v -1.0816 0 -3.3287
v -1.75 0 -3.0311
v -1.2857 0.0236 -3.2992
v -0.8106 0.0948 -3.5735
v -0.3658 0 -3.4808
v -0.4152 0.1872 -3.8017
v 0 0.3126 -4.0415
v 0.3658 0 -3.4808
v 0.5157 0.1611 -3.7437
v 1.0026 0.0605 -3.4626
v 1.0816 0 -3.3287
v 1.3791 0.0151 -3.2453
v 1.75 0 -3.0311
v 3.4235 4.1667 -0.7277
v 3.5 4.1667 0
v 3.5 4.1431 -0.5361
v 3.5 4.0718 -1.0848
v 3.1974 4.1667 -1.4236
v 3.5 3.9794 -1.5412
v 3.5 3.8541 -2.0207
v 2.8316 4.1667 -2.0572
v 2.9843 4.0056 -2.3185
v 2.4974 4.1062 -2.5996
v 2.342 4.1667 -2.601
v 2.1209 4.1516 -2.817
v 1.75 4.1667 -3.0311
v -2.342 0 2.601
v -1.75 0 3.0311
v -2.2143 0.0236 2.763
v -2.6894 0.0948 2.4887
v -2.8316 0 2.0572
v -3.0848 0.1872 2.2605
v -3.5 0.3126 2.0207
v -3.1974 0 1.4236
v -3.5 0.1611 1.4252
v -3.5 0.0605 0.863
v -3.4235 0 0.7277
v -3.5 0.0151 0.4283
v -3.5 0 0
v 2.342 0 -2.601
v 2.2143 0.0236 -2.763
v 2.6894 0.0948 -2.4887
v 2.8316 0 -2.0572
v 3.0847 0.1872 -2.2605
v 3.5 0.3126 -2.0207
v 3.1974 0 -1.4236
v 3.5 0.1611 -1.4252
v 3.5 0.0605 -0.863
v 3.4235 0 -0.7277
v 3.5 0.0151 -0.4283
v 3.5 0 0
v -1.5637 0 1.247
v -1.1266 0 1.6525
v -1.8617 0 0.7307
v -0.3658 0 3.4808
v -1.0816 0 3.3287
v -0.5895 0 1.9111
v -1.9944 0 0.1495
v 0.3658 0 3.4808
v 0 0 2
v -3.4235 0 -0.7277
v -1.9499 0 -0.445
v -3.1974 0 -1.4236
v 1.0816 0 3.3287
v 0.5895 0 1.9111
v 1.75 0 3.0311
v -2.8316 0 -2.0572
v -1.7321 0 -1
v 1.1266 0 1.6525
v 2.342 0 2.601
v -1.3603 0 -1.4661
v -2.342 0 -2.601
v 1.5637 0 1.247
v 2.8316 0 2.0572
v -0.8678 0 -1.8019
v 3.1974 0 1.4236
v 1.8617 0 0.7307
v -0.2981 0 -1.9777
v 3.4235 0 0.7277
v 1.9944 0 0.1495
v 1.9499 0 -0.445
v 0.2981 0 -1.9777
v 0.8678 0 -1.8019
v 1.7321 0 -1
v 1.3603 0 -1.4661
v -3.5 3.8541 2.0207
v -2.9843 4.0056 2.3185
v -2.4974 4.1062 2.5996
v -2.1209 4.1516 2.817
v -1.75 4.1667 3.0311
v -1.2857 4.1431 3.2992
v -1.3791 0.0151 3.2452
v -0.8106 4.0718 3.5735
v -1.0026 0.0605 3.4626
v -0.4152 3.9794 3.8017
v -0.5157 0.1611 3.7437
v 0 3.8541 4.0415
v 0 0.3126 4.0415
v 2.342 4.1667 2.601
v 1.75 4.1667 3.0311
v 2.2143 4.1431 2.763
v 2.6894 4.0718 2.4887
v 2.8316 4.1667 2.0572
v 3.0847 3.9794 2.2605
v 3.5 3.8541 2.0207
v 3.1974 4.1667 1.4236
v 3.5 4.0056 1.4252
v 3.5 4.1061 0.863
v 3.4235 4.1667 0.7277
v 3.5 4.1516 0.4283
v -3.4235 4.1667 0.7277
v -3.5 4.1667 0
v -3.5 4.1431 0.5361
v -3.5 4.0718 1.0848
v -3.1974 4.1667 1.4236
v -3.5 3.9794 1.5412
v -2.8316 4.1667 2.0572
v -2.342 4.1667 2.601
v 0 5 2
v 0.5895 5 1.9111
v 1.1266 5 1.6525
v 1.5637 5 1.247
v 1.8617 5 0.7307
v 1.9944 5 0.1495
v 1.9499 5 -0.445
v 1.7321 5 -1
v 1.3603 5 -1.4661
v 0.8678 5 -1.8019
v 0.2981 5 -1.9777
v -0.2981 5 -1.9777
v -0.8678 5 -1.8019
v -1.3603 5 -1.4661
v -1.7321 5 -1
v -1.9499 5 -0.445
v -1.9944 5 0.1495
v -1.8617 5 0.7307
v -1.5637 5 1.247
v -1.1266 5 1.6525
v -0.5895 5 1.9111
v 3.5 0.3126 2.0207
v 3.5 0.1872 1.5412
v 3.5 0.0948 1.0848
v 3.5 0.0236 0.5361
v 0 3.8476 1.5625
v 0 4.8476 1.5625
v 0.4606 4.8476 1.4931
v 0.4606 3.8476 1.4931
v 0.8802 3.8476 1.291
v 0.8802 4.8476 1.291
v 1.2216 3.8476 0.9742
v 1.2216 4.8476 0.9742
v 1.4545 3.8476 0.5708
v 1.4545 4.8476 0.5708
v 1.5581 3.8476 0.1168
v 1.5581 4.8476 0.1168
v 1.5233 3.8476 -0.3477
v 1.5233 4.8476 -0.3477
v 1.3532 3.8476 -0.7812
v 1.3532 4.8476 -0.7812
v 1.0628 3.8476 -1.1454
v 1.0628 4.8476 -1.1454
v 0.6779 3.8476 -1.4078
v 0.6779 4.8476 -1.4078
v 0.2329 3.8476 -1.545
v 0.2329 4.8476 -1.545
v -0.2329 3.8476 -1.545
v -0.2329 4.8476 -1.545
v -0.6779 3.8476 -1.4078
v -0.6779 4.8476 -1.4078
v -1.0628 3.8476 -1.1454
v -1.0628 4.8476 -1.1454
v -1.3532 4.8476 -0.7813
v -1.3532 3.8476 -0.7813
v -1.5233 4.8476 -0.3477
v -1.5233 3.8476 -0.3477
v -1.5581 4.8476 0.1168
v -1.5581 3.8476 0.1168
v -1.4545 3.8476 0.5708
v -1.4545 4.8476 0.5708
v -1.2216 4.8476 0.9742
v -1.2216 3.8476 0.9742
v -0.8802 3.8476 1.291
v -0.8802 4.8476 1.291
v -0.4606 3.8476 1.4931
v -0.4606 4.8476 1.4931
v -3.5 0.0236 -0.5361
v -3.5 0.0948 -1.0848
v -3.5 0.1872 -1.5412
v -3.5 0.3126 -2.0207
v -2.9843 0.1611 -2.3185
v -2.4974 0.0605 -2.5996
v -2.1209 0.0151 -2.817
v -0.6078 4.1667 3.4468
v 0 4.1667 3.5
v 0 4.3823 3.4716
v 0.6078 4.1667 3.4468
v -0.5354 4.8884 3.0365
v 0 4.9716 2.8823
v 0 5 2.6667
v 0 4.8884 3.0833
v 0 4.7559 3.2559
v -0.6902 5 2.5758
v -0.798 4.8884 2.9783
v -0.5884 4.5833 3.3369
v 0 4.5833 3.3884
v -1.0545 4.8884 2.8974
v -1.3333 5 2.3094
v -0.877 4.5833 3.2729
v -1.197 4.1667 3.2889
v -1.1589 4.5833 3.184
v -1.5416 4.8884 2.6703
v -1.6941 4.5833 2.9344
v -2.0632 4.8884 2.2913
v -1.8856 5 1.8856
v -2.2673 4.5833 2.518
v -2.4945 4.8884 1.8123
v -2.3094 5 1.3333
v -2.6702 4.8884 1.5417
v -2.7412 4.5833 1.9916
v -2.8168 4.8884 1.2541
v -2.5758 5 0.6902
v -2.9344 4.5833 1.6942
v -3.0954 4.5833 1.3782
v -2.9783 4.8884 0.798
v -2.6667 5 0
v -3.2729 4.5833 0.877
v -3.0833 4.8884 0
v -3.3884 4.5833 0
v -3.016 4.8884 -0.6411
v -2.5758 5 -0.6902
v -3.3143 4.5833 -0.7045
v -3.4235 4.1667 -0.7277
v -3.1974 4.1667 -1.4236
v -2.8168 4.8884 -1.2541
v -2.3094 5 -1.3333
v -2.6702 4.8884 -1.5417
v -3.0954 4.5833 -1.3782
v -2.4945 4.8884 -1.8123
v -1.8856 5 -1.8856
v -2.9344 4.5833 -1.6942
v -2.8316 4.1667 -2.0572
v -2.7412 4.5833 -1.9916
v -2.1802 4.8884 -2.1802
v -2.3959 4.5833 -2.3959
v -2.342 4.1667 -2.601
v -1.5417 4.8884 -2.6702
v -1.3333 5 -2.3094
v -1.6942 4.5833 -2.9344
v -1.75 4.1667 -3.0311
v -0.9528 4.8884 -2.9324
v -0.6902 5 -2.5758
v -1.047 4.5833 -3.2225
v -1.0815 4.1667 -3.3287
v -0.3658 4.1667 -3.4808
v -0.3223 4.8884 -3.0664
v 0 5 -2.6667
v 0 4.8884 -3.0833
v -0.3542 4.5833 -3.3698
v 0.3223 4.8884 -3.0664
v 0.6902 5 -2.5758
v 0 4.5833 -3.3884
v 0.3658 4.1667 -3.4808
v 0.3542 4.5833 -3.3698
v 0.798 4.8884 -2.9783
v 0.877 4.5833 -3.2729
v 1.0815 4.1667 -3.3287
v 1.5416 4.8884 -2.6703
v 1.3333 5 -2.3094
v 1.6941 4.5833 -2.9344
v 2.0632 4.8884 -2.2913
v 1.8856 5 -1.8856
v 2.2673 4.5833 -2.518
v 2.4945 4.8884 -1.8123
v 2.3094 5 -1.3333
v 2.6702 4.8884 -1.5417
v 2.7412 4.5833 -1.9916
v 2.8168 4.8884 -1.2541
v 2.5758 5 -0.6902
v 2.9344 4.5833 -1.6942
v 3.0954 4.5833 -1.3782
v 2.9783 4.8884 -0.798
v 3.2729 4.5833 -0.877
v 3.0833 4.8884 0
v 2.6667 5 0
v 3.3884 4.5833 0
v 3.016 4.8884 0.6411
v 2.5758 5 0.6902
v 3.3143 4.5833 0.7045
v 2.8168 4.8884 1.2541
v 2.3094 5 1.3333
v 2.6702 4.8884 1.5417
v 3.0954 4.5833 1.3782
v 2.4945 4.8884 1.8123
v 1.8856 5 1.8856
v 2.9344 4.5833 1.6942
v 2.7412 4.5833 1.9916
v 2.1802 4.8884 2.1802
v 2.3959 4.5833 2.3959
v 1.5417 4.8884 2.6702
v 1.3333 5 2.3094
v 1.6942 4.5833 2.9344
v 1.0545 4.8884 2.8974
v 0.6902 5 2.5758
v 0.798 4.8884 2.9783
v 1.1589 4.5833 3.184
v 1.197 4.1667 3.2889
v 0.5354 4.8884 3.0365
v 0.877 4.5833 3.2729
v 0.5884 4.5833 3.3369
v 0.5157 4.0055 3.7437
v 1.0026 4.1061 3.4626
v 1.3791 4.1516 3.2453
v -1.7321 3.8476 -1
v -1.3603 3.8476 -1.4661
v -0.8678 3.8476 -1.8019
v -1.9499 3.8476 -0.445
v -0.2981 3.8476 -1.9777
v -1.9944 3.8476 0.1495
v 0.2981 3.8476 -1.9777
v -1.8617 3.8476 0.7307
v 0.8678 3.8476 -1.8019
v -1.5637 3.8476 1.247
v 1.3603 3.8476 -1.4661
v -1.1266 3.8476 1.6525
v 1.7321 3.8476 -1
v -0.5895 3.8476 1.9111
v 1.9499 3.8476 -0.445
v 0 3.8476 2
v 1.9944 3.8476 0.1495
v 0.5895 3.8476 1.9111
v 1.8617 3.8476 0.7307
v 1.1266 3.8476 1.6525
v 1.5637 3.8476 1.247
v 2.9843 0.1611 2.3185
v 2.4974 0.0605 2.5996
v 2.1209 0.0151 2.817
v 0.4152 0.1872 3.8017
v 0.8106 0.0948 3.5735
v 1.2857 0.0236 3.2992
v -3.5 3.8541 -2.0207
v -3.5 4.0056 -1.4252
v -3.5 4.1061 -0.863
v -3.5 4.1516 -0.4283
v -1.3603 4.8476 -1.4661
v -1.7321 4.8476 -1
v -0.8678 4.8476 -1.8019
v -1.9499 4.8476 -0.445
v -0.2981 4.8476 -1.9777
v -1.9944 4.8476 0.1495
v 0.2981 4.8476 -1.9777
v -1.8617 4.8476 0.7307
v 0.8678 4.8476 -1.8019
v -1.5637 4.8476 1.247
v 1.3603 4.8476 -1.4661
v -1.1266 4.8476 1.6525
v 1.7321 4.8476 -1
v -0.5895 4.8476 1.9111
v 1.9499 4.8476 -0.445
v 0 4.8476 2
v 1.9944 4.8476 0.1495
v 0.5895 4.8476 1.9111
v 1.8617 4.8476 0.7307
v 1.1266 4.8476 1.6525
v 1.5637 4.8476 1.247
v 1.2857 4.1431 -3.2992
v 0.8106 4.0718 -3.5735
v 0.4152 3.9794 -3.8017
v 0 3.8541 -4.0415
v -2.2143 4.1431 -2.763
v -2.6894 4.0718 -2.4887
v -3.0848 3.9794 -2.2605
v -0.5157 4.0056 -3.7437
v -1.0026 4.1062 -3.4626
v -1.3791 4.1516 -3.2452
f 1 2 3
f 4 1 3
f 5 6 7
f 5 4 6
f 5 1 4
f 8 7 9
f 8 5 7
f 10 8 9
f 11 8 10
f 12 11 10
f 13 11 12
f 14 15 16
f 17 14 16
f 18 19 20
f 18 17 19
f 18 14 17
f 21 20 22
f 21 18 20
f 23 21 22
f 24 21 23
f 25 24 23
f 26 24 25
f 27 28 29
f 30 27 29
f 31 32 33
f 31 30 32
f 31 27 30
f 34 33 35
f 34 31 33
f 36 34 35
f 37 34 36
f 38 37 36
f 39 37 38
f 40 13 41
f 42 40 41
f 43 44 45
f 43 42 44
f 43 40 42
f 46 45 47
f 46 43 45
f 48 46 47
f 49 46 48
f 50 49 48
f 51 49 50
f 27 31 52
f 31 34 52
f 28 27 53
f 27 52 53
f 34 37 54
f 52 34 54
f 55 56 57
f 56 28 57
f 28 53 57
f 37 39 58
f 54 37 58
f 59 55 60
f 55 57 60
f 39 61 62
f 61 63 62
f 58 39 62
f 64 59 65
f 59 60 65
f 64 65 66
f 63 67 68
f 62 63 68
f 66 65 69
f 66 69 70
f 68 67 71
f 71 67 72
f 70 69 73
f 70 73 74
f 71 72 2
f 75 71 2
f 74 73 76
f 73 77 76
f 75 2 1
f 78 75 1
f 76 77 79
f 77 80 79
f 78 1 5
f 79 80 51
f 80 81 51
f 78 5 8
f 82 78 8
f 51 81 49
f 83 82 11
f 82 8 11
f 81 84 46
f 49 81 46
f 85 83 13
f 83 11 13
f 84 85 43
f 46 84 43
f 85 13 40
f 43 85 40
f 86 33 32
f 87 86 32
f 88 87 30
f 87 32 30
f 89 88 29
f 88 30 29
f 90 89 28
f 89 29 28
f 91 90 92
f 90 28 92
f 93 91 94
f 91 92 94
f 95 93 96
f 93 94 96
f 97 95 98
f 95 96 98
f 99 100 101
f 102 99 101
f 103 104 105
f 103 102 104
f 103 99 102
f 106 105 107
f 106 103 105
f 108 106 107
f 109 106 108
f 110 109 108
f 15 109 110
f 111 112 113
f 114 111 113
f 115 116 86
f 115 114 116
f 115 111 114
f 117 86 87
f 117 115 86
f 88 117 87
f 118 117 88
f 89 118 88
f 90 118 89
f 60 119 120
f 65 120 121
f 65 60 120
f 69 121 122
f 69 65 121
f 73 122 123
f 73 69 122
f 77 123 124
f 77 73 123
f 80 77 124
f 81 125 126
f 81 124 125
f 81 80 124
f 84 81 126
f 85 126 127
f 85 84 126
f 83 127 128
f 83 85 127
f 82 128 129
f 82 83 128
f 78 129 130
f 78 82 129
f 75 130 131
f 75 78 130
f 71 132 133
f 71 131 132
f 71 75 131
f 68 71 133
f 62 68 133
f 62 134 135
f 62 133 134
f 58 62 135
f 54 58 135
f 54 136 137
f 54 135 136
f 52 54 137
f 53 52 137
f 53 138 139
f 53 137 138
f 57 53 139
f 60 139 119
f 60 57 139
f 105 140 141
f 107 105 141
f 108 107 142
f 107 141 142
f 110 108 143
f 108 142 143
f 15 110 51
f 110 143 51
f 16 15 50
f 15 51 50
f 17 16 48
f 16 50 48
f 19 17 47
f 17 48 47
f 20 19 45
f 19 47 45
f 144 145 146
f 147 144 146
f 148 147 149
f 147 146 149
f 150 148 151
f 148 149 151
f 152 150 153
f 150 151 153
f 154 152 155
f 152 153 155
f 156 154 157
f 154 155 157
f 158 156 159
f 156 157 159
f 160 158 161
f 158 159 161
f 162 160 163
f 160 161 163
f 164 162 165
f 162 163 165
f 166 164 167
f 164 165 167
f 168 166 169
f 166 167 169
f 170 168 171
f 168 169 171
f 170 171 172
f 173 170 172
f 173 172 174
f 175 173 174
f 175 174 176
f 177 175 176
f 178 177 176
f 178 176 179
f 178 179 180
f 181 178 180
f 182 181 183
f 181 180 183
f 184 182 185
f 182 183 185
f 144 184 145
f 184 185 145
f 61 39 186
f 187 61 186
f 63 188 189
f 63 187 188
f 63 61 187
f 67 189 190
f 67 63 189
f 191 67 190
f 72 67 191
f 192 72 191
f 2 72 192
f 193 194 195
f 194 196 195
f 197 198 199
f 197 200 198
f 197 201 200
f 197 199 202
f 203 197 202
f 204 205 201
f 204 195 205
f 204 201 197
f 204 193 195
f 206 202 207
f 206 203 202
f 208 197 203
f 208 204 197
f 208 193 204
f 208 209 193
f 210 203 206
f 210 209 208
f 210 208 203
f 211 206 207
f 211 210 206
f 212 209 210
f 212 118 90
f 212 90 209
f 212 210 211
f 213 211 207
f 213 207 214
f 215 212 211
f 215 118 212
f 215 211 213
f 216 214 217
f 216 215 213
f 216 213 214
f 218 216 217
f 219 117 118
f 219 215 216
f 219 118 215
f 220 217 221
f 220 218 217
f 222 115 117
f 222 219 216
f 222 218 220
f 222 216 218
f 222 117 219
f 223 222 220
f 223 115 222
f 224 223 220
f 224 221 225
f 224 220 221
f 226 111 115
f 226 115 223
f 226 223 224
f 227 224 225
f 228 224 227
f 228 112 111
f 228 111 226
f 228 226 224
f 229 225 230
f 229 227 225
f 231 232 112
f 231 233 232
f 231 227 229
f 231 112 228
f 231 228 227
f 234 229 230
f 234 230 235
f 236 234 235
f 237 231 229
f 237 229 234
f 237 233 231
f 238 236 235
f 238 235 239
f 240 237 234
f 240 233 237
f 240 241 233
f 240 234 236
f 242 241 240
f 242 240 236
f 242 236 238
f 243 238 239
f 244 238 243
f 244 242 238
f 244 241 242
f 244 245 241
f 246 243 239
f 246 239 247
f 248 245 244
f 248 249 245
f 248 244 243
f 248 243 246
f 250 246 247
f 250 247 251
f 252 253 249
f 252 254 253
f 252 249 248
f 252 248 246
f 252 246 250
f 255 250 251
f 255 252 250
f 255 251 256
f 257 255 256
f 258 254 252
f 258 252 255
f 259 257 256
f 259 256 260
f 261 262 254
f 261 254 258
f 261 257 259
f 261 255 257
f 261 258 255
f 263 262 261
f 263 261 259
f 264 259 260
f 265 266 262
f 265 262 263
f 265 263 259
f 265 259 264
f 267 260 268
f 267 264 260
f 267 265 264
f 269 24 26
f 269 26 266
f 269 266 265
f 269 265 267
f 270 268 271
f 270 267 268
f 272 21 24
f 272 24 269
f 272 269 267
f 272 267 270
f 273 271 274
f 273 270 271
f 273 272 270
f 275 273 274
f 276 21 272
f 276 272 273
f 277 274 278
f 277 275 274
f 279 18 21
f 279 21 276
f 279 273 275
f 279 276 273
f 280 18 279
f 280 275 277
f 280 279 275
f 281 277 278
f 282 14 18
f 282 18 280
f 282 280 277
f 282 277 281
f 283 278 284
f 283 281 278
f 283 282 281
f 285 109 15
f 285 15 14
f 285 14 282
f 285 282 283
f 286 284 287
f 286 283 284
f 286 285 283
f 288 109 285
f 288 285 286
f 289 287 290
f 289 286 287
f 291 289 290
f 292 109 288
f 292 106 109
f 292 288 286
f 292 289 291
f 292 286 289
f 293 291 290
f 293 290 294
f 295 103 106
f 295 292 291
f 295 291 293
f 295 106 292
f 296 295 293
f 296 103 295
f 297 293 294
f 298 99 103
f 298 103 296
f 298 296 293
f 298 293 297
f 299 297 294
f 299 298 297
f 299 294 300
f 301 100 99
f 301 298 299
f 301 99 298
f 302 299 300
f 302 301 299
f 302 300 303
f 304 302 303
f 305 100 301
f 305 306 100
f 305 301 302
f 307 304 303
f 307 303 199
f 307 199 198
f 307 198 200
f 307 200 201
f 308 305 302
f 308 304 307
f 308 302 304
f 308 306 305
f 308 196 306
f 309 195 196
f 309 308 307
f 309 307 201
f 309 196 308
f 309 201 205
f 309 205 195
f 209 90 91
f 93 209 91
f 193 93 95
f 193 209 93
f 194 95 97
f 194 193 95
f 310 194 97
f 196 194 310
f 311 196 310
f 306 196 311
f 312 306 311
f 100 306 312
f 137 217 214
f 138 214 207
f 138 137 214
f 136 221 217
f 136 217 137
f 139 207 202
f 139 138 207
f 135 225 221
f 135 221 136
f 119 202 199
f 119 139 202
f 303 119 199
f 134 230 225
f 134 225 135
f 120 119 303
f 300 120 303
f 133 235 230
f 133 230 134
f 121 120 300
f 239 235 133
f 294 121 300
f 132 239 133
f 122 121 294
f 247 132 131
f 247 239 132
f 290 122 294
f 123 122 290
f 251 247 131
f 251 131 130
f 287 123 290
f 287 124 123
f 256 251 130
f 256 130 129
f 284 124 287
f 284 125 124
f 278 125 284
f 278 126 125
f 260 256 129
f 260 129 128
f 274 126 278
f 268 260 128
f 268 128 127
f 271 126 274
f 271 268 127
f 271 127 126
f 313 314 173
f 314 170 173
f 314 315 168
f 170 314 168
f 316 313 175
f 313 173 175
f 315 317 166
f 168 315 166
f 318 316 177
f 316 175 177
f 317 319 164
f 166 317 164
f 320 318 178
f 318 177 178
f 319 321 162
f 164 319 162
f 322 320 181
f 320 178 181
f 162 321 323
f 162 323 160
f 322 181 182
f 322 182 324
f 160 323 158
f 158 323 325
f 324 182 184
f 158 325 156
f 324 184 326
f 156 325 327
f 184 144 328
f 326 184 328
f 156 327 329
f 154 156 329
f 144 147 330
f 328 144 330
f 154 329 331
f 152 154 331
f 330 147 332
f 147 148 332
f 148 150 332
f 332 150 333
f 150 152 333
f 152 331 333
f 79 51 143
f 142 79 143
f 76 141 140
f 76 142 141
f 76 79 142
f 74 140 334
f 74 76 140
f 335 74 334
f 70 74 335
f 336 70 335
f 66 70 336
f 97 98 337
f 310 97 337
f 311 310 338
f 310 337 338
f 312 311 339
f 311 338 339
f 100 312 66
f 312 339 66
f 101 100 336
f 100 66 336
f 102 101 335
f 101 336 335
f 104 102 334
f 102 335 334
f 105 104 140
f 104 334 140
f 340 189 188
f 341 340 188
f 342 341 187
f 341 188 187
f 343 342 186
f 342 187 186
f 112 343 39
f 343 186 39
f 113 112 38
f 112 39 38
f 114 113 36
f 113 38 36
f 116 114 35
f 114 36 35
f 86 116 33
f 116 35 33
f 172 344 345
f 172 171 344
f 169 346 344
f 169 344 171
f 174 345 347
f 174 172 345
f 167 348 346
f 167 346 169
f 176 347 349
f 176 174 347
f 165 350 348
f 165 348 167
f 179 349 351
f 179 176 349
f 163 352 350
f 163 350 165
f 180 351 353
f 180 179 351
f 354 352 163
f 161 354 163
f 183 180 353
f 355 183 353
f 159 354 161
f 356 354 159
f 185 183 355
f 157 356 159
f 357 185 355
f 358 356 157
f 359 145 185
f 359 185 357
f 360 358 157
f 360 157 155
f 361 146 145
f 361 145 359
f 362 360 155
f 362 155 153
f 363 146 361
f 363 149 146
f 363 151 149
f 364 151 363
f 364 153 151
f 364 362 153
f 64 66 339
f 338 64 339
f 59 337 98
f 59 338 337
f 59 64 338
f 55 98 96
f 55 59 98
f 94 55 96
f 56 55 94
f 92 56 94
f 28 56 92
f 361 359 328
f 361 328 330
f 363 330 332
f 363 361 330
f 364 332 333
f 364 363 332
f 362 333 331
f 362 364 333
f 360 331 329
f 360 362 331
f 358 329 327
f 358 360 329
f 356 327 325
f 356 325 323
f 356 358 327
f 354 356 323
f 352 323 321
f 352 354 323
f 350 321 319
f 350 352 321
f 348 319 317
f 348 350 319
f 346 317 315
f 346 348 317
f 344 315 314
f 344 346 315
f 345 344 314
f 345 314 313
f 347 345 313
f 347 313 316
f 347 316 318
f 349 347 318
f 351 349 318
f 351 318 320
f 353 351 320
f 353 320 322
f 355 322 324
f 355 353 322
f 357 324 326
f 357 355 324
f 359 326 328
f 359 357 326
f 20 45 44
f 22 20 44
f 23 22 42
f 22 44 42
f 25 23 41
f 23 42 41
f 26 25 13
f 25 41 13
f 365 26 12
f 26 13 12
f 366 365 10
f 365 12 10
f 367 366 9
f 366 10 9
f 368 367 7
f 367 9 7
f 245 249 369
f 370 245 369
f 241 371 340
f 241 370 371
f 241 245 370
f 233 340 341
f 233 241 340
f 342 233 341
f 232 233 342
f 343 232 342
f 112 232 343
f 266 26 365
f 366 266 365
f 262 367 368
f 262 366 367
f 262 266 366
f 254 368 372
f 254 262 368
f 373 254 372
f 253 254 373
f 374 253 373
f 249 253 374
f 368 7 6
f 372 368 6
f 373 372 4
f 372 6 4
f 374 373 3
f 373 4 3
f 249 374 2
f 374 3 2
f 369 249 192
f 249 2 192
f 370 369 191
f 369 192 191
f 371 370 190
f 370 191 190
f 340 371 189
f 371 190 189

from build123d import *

# Parameters (mm, degrees)
EXTRUDE1_DEPTH      = 5
SKETCH7_R           = 2
CUT_EXTRUDE4_DEPTH  = 8.320063752
CUT_EXTRUDE5_START  = -0.833333
SKETCH13_OUTSIDE_W  = 37.296
SKETCH13_OUTSIDE_H  = 38.378
SKETCH13_OUTSIDE_R  = 3.5
CUT_EXTRUDE5_DEPTH  = 7.486730752
CUT_EXTRUDE5_DRAFT  = -60
SKETCH19_OUTSIDE_W  = 40.182
SKETCH19_OUTSIDE_H  = 41.264
SKETCH19_OUTSIDE_R  = 3.5
CUT_EXTRUDE6_DEPTH  = 8.320063752
CUT_EXTRUDE6_DRAFT  = -60
BOSS_EXTRUDE1_START = -0.1524
SKETCH20_R          = 2
SKETCH20_R_2        = 1.5625
BOSS_EXTRUDE1_DEPTH = 1


with BuildPart() as part:
    # Sketch1 → Extrude1 (new body)
    with BuildSketch(Plane(origin=(0, 0, 0), x_dir=(1, 0, 0), z_dir=(0, 1, 0))):
        Polygon((0, 4.041451884), (-3.5, 2.020725942), (-3.5, -2.020725942), (0, -4.041451884), (3.5, -2.020725942), (3.5, 2.020725942), align=None)
    extrude(amount=EXTRUDE1_DEPTH)

    # Sketch7 → Cut-Extrude4 (cut, through all)
    with BuildSketch(Plane(origin=(0, 0, 0), x_dir=(1, 0, 0), z_dir=(0, 1, 0))):
        with Locations(Location((0, 0, 0), (0, 0, 270))):
            Circle(SKETCH7_R)
    extrude(amount=CUT_EXTRUDE4_DEPTH, mode=Mode.SUBTRACT)

    # Sketch18 → Cut-Revolve1 (revolve, cut)
    with BuildSketch(Plane(origin=(0, 0, 0), x_dir=(0, 0, -1), z_dir=(1, 0, 0)), mode=Mode.PRIVATE) as cut_revolve1_sk:
        with BuildLine():
            Line((3.5, 4.166666667), (4.041451884, 4.166666667))
            Line((4.041451884, 4.166666667), (4.041451884, 5))
            Line((4.041451884, 5), (2.666666667, 5))
            ThreePointArc((2.666666667, 5), (3.255922318, 4.755922318), (3.5, 4.166666667))
        make_face()
    revolve(cut_revolve1_sk.sketch.rotate(Axis((0, 5, 0), (0, -1, 0)), 180), axis=Axis((0, 5, 0), (0, -1, 0)), mode=Mode.SUBTRACT)


with BuildPart() as cut_extrude5_tool:
    # Sketch13 outside → Cut-Extrude5 (with draft: the straight prism first)
    with BuildSketch(Plane(origin=(0, 5, 0), x_dir=(1, 0, 0), z_dir=(0, 1, 0)).offset(CUT_EXTRUDE5_START)):
        Rectangle(SKETCH13_OUTSIDE_W, SKETCH13_OUTSIDE_H)
        Circle(SKETCH13_OUTSIDE_R, mode=Mode.SUBTRACT)
    extrude(amount=-CUT_EXTRUDE5_DEPTH)
    # Cut-Extrude5: the draft: its side faces are tilted about the plane it starts from
    cut_extrude5_sides = [cut_extrude5_tool.faces().sort_by_distance(p)[0] for p in [
        (0, 0.423301624, 19.189),
        (18.648, 0.423301624, 0),
        (0, 0.423301624, -19.189),
        (-18.648, 0.423301624, 0),
        (-3.5, 0.423301624, 0),
    ]]
    draft(cut_extrude5_sides, Plane(origin=(0, 5, 0), x_dir=(1, 0, 0), z_dir=(0, 1, 0)).offset(CUT_EXTRUDE5_START), CUT_EXTRUDE5_DRAFT)


with BuildPart() as part_1:
    add(part.part)

    # Cut-Extrude5: cut by cut_extrude5_tool
    add(cut_extrude5_tool.part, mode=Mode.SUBTRACT)


with BuildPart() as cut_extrude6_tool:
    # Sketch19 outside → Cut-Extrude6 (with draft: the straight prism first)
    with BuildSketch(Plane.XZ):
        Rectangle(SKETCH19_OUTSIDE_W, SKETCH19_OUTSIDE_H)
        Circle(SKETCH19_OUTSIDE_R, mode=Mode.SUBTRACT)
    extrude(amount=-CUT_EXTRUDE6_DEPTH)
    # Cut-Extrude6: the draft: its side faces are tilted about the plane it starts from
    cut_extrude6_sides = [cut_extrude6_tool.faces().sort_by_distance(p)[0] for p in [
        (0, 4.160031876, -20.632),
        (20.091, 4.160031876, 0),
        (0, 4.160031876, 20.632),
        (-20.091, 4.160031876, 0),
        (-3.5, 4.160031876, 0),
    ]]
    draft(cut_extrude6_sides, Plane.XZ, CUT_EXTRUDE6_DRAFT)


with BuildPart() as part_2:
    add(part_1.part)

    # Cut-Extrude6: cut by cut_extrude6_tool
    add(cut_extrude6_tool.part, mode=Mode.SUBTRACT)


with BuildPart() as body_2:
    # Sketch20 → Boss-Extrude1 (new body)
    with BuildSketch(Plane(origin=(0, 5, 0), x_dir=(1, 0, 0), z_dir=(0, 1, 0)).offset(BOSS_EXTRUDE1_START)):
        with Locations(Location((0, 0, 0), (0, 0, 270))):
            Circle(SKETCH20_R)
        with Locations(Location((0, 0, 0), (0, 0, 270))):
            Circle(SKETCH20_R_2, mode=Mode.SUBTRACT)
    extrude(amount=-BOSS_EXTRUDE1_DEPTH)


solid = Compound([part_2.part, body_2.part])
